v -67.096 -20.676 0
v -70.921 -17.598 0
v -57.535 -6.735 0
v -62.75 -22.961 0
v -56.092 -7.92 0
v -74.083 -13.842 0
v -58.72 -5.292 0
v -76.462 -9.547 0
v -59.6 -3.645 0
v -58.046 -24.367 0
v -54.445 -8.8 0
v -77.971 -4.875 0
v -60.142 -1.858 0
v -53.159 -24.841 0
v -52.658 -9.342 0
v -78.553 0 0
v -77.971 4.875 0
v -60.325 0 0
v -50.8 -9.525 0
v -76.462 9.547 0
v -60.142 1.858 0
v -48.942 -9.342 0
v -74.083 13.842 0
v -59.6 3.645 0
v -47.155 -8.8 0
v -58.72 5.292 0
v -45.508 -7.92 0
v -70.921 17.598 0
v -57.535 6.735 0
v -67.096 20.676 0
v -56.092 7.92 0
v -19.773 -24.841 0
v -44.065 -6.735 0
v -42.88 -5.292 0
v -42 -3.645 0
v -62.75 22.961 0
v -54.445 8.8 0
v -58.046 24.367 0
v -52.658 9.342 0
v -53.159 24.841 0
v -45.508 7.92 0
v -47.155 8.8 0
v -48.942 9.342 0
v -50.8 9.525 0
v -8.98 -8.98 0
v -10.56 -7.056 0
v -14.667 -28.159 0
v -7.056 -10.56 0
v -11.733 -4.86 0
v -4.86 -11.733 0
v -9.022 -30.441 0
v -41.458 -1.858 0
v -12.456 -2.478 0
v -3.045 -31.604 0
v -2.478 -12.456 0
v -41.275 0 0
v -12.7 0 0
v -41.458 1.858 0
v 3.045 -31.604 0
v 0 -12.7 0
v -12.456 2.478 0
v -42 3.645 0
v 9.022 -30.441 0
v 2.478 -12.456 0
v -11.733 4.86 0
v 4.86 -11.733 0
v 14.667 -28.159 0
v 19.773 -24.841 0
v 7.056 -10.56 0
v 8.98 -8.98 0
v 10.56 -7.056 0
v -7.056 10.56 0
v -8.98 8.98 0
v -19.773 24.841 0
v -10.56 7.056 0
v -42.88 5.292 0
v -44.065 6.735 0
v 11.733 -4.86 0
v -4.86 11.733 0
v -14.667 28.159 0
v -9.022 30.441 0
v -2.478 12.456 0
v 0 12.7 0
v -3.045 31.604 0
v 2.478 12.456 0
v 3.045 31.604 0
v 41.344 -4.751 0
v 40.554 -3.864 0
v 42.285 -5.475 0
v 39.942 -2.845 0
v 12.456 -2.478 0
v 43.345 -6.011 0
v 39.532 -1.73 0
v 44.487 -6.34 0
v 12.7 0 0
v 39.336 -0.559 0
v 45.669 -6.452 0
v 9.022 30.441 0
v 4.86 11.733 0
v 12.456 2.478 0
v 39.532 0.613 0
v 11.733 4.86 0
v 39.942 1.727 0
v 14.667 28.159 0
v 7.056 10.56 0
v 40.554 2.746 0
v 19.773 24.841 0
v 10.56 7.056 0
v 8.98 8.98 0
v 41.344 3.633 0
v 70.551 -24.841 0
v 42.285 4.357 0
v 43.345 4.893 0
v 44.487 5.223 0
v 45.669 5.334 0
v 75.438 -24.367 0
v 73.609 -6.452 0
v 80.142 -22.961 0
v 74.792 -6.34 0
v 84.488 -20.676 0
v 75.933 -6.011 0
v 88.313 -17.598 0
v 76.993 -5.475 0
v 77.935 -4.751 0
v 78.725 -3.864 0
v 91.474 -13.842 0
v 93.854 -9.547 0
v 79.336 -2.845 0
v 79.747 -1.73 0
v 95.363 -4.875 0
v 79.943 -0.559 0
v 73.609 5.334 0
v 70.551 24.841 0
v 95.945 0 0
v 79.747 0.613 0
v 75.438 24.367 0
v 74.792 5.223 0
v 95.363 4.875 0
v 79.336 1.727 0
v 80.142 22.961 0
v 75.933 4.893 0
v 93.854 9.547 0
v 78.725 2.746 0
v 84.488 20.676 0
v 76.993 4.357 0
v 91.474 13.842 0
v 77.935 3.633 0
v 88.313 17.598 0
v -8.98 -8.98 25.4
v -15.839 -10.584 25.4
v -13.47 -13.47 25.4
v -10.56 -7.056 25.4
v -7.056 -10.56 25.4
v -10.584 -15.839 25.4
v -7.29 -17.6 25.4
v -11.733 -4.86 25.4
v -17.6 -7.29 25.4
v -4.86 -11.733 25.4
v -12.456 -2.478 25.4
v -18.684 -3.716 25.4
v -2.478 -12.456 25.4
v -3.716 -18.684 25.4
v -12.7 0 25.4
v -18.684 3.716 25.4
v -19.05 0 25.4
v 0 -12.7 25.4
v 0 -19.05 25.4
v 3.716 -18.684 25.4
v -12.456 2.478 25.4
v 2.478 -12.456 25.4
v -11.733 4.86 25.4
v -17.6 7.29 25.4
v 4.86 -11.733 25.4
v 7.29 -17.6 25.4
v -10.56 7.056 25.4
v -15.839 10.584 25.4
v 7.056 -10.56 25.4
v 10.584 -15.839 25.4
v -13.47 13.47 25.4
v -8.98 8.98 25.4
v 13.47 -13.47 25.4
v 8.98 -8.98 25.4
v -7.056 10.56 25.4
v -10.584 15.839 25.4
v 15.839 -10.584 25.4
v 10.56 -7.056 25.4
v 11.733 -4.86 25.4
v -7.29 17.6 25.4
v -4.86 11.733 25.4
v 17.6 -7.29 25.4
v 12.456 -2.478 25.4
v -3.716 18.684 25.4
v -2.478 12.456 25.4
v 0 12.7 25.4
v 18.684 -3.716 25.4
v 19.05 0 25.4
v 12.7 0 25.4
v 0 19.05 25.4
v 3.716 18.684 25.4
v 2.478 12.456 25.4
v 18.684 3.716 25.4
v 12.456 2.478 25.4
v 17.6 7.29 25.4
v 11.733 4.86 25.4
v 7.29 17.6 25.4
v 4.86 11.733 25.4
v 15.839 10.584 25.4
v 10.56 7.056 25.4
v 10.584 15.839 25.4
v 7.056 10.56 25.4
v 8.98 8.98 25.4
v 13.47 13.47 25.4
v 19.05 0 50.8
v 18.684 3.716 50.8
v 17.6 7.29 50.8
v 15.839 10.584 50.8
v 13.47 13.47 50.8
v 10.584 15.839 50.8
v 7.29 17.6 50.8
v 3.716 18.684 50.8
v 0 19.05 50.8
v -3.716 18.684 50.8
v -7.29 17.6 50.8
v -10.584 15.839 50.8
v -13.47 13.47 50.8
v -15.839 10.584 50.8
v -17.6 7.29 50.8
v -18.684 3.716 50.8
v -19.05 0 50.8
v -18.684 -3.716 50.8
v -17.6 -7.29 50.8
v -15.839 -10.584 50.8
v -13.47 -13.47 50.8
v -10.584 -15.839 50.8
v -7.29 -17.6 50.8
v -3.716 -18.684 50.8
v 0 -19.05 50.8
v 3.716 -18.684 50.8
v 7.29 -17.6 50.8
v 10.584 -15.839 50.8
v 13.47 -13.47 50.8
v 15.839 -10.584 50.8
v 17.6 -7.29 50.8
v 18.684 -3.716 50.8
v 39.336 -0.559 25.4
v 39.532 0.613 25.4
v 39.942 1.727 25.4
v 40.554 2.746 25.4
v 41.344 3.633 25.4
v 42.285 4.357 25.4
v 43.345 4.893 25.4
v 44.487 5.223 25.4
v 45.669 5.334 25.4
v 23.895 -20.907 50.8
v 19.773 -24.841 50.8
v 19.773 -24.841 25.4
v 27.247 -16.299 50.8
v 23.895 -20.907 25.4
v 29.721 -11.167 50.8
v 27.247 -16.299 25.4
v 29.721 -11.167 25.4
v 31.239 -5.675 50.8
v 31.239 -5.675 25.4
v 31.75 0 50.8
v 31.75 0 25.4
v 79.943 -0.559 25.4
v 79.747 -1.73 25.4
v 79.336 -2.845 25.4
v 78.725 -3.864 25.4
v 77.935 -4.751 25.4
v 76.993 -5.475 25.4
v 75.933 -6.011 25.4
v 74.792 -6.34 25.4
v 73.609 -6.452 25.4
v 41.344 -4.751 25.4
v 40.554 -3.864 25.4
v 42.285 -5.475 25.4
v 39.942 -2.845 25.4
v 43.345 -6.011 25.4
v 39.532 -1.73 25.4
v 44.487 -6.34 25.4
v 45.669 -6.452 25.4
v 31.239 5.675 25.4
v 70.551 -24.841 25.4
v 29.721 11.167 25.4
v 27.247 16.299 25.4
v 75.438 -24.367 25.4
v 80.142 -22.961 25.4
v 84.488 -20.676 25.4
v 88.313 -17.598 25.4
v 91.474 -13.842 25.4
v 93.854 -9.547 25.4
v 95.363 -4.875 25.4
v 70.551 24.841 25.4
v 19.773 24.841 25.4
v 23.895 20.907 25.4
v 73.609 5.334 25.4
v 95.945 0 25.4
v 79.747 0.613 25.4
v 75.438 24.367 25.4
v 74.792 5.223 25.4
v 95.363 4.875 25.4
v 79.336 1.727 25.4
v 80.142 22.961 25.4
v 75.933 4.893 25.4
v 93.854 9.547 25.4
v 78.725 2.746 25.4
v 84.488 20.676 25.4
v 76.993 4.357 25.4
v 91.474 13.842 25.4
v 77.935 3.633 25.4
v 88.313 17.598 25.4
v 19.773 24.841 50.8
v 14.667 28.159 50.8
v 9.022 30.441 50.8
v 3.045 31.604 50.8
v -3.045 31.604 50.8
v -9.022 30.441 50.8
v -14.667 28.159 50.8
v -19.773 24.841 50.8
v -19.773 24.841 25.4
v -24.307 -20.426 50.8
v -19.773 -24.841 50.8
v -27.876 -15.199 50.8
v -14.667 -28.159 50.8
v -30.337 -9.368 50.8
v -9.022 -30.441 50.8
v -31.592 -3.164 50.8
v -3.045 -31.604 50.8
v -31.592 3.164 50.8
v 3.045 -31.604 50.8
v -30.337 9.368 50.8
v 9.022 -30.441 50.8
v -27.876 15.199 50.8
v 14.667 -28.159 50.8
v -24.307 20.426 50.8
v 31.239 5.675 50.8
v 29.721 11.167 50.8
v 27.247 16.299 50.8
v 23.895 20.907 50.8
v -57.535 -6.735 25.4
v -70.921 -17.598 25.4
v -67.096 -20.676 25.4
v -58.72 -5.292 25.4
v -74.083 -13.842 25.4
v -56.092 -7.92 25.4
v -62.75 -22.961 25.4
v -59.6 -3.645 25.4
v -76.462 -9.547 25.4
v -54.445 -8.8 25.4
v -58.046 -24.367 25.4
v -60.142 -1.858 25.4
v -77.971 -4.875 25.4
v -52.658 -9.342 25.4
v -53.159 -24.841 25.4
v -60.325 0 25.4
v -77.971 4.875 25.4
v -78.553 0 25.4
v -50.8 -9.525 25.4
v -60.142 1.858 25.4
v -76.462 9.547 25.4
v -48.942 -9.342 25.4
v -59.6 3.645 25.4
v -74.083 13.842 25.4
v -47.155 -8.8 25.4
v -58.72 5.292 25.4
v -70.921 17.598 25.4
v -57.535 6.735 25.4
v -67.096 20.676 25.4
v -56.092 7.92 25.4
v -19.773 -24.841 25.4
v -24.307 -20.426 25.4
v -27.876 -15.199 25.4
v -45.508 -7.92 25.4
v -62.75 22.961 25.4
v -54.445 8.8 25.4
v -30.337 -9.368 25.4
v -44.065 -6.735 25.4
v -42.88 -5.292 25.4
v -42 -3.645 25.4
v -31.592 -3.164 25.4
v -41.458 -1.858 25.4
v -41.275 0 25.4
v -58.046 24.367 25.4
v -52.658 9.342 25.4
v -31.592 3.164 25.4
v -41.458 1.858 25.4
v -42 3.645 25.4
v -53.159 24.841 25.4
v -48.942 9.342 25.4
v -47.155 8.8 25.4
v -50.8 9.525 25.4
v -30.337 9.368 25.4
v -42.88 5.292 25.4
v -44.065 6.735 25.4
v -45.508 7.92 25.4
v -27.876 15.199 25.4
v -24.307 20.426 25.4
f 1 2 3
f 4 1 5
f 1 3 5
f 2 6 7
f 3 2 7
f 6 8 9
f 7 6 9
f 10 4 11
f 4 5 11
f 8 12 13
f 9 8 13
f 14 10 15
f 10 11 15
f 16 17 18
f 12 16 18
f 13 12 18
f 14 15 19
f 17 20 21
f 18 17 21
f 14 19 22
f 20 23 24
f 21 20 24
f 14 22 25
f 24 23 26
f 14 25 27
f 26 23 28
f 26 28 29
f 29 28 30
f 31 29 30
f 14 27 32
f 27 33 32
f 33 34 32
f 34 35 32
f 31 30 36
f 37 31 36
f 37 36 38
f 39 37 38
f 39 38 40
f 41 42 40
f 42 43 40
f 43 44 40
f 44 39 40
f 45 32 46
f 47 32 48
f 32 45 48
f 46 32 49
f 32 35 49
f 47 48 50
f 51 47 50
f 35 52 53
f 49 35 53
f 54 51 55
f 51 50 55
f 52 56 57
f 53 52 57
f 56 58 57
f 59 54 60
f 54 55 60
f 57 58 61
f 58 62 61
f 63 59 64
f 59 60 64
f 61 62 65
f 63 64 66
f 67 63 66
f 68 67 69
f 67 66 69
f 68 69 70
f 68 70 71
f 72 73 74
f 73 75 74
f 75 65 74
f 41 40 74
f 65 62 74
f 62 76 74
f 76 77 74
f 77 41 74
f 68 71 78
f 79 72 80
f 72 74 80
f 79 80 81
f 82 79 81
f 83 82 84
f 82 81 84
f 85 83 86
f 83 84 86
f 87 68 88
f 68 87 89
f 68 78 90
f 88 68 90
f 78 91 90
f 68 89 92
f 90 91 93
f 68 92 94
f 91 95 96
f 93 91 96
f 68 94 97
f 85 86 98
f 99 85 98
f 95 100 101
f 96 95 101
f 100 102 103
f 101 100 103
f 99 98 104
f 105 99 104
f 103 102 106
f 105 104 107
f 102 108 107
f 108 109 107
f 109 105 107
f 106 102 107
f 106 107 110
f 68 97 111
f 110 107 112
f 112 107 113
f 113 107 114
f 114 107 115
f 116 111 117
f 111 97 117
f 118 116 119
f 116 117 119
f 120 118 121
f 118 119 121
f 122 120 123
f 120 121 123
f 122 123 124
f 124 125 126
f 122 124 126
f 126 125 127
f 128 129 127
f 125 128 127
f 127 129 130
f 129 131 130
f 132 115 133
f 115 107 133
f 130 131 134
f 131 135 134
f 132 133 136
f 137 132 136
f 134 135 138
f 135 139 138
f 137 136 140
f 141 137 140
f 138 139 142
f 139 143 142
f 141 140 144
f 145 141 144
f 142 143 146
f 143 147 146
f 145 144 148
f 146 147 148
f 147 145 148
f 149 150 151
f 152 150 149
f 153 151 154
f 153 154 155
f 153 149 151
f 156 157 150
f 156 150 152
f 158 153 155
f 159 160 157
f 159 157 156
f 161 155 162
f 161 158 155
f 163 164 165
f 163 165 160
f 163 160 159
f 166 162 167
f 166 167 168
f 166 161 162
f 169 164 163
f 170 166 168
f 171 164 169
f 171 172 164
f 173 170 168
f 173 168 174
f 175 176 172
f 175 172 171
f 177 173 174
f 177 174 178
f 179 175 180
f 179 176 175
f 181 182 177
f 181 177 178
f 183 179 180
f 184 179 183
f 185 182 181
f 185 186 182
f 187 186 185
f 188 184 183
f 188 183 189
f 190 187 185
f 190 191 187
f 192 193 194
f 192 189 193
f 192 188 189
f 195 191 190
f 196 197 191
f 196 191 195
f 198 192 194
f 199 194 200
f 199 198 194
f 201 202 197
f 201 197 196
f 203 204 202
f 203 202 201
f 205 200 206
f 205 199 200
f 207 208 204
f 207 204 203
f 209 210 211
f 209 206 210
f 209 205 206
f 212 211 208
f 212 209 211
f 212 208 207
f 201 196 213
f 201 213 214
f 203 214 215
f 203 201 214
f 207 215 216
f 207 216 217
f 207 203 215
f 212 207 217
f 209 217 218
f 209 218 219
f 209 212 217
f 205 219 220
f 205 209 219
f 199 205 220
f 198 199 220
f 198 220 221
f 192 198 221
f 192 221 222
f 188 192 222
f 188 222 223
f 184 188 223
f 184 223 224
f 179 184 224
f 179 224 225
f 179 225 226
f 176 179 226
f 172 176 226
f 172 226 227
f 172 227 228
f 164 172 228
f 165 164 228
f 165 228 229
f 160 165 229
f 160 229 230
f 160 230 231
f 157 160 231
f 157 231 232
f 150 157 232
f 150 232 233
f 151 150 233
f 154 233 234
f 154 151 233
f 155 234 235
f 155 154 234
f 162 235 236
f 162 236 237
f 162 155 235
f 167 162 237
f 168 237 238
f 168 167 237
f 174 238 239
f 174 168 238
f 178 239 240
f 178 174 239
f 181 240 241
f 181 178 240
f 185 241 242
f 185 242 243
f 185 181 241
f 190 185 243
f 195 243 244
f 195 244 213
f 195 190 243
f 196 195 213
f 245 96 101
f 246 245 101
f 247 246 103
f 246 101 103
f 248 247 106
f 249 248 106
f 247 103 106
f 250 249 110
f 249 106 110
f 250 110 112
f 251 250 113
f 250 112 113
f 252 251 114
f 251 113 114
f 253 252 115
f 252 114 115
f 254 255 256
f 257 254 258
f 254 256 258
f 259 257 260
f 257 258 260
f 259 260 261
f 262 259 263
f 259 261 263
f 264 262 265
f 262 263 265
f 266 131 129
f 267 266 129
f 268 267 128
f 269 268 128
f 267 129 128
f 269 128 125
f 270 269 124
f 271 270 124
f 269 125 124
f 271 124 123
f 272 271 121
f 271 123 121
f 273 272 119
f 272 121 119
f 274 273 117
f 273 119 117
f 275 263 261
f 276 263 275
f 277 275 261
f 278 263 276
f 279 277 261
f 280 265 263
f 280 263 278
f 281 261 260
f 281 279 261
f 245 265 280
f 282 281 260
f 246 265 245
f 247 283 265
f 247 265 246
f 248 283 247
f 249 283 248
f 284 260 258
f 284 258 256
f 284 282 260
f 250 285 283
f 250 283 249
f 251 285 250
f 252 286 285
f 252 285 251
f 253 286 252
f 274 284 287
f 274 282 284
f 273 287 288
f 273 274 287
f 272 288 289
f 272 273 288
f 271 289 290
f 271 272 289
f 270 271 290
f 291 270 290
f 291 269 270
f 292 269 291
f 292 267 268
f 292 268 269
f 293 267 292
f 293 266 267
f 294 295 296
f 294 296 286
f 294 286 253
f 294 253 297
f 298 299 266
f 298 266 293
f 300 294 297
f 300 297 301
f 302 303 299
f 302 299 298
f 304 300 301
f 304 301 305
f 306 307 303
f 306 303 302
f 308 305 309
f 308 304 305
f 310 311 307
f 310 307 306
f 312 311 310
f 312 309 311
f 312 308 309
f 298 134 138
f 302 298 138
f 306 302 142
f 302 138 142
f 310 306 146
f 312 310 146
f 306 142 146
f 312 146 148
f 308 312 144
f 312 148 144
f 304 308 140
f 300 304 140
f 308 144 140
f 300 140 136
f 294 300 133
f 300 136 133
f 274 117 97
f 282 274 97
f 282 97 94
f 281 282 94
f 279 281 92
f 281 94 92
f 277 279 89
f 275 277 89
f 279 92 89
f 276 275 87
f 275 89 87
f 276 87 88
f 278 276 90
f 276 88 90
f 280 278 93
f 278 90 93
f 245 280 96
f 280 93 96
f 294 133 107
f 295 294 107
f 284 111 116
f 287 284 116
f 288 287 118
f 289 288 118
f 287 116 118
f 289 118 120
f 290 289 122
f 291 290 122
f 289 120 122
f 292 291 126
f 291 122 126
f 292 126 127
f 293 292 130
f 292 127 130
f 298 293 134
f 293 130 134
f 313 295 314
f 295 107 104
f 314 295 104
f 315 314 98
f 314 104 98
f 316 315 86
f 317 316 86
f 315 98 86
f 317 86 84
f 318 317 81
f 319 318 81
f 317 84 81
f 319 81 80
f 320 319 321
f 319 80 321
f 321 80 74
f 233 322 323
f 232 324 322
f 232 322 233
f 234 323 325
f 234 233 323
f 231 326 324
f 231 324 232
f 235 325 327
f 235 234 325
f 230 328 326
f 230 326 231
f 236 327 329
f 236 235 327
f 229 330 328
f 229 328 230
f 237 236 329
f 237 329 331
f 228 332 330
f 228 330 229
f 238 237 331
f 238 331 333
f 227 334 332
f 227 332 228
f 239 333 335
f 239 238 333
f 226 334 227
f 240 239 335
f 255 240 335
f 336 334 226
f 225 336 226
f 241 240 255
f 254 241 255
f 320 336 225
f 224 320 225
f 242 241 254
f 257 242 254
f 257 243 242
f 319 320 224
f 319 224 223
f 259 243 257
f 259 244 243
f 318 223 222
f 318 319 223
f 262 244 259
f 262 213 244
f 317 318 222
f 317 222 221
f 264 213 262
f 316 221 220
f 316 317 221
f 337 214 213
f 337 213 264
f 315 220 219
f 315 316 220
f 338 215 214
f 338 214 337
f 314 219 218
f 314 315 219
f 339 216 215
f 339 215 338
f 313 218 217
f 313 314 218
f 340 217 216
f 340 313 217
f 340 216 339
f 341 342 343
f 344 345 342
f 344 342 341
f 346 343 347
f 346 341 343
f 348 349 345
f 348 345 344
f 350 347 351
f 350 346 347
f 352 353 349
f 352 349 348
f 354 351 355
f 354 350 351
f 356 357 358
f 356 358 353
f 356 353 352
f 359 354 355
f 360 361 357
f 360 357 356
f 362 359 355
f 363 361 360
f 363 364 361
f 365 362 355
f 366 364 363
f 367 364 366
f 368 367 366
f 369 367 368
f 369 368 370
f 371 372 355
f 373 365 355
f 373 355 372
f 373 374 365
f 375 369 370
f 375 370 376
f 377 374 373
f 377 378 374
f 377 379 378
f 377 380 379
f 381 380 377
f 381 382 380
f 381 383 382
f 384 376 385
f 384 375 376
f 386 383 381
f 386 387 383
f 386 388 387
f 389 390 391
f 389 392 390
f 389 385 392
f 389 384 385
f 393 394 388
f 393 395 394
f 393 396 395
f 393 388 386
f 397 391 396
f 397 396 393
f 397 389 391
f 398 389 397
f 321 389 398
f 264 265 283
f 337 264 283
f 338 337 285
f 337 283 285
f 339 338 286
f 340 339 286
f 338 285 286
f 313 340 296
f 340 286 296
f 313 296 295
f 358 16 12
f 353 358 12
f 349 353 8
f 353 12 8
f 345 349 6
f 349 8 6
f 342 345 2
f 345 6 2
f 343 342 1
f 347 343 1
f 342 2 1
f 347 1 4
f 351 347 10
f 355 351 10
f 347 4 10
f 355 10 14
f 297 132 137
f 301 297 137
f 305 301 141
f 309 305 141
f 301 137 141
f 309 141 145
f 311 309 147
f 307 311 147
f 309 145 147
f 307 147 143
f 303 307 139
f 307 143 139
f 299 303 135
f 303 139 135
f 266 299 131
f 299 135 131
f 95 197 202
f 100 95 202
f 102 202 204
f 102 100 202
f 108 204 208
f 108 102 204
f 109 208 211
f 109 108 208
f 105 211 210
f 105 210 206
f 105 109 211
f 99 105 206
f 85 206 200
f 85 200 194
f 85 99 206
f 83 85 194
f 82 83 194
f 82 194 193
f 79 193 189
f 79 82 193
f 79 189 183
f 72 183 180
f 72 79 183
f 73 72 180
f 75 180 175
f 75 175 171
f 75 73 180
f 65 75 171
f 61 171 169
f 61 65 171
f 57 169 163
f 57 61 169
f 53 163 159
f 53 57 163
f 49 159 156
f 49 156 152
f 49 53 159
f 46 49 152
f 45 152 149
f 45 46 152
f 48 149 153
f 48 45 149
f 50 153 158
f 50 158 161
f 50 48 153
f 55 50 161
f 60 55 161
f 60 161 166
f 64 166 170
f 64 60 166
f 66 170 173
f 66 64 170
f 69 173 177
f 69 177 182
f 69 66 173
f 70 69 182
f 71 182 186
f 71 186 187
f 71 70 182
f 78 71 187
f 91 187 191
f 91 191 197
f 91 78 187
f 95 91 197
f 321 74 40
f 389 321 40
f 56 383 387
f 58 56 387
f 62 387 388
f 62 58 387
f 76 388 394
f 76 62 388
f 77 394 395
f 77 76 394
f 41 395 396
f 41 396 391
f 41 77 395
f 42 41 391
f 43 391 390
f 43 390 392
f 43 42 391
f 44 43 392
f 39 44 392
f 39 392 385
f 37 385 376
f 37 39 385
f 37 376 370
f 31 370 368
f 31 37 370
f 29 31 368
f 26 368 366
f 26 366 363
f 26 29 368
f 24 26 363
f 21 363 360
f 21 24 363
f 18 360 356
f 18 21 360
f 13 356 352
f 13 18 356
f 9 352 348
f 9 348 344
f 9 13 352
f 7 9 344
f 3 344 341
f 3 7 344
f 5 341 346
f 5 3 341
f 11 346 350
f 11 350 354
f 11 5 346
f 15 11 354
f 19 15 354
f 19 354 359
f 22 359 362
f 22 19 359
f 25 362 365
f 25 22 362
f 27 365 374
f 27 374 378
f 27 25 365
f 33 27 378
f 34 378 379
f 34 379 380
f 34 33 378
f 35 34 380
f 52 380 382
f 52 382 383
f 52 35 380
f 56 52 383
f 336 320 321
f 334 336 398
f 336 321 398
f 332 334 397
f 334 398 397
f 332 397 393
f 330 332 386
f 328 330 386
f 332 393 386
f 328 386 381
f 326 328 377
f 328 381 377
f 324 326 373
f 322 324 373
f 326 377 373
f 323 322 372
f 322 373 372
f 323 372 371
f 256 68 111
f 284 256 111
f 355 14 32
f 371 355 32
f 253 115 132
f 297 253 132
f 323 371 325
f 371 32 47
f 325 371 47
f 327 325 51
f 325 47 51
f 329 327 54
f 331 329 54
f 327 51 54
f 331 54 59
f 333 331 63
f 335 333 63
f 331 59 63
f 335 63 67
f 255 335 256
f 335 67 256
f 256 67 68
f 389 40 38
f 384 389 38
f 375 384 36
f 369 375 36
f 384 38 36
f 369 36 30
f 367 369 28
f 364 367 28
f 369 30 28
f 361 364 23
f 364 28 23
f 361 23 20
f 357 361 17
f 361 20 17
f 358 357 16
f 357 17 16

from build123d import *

# Parameters (mm, degrees)
F0_R     = 9.525
F1_DEPTH = 25.4
F0_R_2   = 19.05
F2_DEPTH = 50.8
F0_R_3   = 12.7
F3_DEPTH = 25.4


with BuildPart() as f1:
    # F0 (on Top) → F1 (new body)
    with BuildSketch(Plane.XY):
        with BuildLine():
            ThreePointArc((-19.7731447858, -24.8412005603), (-31.75, 0), (-19.7731447858, 24.8412005603))
            Line((-19.7731447858, 24.8412005603), (-53.1594258137, 24.8412005603))
            ThreePointArc((-53.1594258137, 24.8412005603), (-70.9212738909, 17.598203421), (-78.5532782821, 0))
            ThreePointArc((-78.5532782821, 0), (-70.9212738909, -17.598203421), (-53.1594258137, -24.8412005603))
            Line((-53.1594258137, -24.8412005603), (-19.7731447858, -24.8412005603))
        make_face()
        with Locations((-50.8, 0)):
            Circle(F0_R, mode=Mode.SUBTRACT)
    extrude(amount=F1_DEPTH)

    # F0 (on Top) → F2 (join)
    with BuildSketch(Plane.XY):
        with BuildLine():
            ThreePointArc((-19.7731447858, -24.8412005603), (0, -31.75), (19.7731447858, -24.8412005603))
            Line((19.7731447858, -24.8412005603), (-19.7731447858, -24.8412005603))
        make_face()
        with BuildLine():
            Line((-19.7731447858, 24.8412005603), (19.7731447858, 24.8412005603))
            ThreePointArc((19.7731447858, 24.8412005603), (0, 31.75), (-19.7731447858, 24.8412005603))
        make_face()
        with BuildLine():
            ThreePointArc((19.7731447858, -24.8412005603), (28.5994741818, -13.7888569695), (31.75, 0))
            ThreePointArc((31.75, 0), (28.5994741818, 13.7888569695), (19.7731447858, 24.8412005603))
            Line((19.7731447858, 24.8412005603), (-19.7731447858, 24.8412005603))
            ThreePointArc((-19.7731447858, 24.8412005603), (-31.75, 0), (-19.7731447858, -24.8412005603))
            Line((-19.7731447858, -24.8412005603), (19.7731447858, -24.8412005603))
        make_face()
        Circle(F0_R_2, mode=Mode.SUBTRACT)
    extrude(amount=F2_DEPTH)

    # F0 (on Top) → F3 (join)
    with BuildSketch(Plane.XY):
        with BuildLine():
            ThreePointArc((19.7731447858, 24.8412005603), (28.5994741818, 13.7888569695), (31.75, 0))
            ThreePointArc((31.75, 0), (28.5994741818, -13.7888569695), (19.7731447858, -24.8412005603))
            Line((19.7731447858, -24.8412005603), (70.5508692495, -24.8412005603))
            ThreePointArc((70.5508692495, -24.8412005603), (88.3127173267, -17.598203421), (95.9447217179, 0))
            ThreePointArc((95.9447217179, 0), (88.3127173267, 17.598203421), (70.5508692495, 24.8412005603))
            Line((70.5508692495, 24.8412005603), (19.7731447858, 24.8412005603))
        make_face()
        with BuildLine():
            ThreePointArc((39.3356828899, -0.5587994397), (41.3437381638, 3.6329638912), (45.6692023039, 5.3340005688))
            Line((45.6692023039, 5.3340005688), (73.6092023039, 5.3340005688))
            ThreePointArc((73.6092023039, 5.3340005688), (77.934666444, 3.6329638912), (79.9427217179, -0.5587994397))
            ThreePointArc((79.9427217179, -0.5587994397), (77.934666444, -4.7505627706), (73.6092023039, -6.4515994482))
            Line((73.6092023039, -6.4515994482), (45.6692023039, -6.4515994482))
            ThreePointArc((45.6692023039, -6.4515994482), (41.3437381638, -4.7505627706), (39.3356828899, -0.5587994397))
        make_face(mode=Mode.SUBTRACT)
        Circle(F0_R_2)
        Circle(F0_R_3, mode=Mode.SUBTRACT)
    extrude(amount=F3_DEPTH)


solid = f1.part
